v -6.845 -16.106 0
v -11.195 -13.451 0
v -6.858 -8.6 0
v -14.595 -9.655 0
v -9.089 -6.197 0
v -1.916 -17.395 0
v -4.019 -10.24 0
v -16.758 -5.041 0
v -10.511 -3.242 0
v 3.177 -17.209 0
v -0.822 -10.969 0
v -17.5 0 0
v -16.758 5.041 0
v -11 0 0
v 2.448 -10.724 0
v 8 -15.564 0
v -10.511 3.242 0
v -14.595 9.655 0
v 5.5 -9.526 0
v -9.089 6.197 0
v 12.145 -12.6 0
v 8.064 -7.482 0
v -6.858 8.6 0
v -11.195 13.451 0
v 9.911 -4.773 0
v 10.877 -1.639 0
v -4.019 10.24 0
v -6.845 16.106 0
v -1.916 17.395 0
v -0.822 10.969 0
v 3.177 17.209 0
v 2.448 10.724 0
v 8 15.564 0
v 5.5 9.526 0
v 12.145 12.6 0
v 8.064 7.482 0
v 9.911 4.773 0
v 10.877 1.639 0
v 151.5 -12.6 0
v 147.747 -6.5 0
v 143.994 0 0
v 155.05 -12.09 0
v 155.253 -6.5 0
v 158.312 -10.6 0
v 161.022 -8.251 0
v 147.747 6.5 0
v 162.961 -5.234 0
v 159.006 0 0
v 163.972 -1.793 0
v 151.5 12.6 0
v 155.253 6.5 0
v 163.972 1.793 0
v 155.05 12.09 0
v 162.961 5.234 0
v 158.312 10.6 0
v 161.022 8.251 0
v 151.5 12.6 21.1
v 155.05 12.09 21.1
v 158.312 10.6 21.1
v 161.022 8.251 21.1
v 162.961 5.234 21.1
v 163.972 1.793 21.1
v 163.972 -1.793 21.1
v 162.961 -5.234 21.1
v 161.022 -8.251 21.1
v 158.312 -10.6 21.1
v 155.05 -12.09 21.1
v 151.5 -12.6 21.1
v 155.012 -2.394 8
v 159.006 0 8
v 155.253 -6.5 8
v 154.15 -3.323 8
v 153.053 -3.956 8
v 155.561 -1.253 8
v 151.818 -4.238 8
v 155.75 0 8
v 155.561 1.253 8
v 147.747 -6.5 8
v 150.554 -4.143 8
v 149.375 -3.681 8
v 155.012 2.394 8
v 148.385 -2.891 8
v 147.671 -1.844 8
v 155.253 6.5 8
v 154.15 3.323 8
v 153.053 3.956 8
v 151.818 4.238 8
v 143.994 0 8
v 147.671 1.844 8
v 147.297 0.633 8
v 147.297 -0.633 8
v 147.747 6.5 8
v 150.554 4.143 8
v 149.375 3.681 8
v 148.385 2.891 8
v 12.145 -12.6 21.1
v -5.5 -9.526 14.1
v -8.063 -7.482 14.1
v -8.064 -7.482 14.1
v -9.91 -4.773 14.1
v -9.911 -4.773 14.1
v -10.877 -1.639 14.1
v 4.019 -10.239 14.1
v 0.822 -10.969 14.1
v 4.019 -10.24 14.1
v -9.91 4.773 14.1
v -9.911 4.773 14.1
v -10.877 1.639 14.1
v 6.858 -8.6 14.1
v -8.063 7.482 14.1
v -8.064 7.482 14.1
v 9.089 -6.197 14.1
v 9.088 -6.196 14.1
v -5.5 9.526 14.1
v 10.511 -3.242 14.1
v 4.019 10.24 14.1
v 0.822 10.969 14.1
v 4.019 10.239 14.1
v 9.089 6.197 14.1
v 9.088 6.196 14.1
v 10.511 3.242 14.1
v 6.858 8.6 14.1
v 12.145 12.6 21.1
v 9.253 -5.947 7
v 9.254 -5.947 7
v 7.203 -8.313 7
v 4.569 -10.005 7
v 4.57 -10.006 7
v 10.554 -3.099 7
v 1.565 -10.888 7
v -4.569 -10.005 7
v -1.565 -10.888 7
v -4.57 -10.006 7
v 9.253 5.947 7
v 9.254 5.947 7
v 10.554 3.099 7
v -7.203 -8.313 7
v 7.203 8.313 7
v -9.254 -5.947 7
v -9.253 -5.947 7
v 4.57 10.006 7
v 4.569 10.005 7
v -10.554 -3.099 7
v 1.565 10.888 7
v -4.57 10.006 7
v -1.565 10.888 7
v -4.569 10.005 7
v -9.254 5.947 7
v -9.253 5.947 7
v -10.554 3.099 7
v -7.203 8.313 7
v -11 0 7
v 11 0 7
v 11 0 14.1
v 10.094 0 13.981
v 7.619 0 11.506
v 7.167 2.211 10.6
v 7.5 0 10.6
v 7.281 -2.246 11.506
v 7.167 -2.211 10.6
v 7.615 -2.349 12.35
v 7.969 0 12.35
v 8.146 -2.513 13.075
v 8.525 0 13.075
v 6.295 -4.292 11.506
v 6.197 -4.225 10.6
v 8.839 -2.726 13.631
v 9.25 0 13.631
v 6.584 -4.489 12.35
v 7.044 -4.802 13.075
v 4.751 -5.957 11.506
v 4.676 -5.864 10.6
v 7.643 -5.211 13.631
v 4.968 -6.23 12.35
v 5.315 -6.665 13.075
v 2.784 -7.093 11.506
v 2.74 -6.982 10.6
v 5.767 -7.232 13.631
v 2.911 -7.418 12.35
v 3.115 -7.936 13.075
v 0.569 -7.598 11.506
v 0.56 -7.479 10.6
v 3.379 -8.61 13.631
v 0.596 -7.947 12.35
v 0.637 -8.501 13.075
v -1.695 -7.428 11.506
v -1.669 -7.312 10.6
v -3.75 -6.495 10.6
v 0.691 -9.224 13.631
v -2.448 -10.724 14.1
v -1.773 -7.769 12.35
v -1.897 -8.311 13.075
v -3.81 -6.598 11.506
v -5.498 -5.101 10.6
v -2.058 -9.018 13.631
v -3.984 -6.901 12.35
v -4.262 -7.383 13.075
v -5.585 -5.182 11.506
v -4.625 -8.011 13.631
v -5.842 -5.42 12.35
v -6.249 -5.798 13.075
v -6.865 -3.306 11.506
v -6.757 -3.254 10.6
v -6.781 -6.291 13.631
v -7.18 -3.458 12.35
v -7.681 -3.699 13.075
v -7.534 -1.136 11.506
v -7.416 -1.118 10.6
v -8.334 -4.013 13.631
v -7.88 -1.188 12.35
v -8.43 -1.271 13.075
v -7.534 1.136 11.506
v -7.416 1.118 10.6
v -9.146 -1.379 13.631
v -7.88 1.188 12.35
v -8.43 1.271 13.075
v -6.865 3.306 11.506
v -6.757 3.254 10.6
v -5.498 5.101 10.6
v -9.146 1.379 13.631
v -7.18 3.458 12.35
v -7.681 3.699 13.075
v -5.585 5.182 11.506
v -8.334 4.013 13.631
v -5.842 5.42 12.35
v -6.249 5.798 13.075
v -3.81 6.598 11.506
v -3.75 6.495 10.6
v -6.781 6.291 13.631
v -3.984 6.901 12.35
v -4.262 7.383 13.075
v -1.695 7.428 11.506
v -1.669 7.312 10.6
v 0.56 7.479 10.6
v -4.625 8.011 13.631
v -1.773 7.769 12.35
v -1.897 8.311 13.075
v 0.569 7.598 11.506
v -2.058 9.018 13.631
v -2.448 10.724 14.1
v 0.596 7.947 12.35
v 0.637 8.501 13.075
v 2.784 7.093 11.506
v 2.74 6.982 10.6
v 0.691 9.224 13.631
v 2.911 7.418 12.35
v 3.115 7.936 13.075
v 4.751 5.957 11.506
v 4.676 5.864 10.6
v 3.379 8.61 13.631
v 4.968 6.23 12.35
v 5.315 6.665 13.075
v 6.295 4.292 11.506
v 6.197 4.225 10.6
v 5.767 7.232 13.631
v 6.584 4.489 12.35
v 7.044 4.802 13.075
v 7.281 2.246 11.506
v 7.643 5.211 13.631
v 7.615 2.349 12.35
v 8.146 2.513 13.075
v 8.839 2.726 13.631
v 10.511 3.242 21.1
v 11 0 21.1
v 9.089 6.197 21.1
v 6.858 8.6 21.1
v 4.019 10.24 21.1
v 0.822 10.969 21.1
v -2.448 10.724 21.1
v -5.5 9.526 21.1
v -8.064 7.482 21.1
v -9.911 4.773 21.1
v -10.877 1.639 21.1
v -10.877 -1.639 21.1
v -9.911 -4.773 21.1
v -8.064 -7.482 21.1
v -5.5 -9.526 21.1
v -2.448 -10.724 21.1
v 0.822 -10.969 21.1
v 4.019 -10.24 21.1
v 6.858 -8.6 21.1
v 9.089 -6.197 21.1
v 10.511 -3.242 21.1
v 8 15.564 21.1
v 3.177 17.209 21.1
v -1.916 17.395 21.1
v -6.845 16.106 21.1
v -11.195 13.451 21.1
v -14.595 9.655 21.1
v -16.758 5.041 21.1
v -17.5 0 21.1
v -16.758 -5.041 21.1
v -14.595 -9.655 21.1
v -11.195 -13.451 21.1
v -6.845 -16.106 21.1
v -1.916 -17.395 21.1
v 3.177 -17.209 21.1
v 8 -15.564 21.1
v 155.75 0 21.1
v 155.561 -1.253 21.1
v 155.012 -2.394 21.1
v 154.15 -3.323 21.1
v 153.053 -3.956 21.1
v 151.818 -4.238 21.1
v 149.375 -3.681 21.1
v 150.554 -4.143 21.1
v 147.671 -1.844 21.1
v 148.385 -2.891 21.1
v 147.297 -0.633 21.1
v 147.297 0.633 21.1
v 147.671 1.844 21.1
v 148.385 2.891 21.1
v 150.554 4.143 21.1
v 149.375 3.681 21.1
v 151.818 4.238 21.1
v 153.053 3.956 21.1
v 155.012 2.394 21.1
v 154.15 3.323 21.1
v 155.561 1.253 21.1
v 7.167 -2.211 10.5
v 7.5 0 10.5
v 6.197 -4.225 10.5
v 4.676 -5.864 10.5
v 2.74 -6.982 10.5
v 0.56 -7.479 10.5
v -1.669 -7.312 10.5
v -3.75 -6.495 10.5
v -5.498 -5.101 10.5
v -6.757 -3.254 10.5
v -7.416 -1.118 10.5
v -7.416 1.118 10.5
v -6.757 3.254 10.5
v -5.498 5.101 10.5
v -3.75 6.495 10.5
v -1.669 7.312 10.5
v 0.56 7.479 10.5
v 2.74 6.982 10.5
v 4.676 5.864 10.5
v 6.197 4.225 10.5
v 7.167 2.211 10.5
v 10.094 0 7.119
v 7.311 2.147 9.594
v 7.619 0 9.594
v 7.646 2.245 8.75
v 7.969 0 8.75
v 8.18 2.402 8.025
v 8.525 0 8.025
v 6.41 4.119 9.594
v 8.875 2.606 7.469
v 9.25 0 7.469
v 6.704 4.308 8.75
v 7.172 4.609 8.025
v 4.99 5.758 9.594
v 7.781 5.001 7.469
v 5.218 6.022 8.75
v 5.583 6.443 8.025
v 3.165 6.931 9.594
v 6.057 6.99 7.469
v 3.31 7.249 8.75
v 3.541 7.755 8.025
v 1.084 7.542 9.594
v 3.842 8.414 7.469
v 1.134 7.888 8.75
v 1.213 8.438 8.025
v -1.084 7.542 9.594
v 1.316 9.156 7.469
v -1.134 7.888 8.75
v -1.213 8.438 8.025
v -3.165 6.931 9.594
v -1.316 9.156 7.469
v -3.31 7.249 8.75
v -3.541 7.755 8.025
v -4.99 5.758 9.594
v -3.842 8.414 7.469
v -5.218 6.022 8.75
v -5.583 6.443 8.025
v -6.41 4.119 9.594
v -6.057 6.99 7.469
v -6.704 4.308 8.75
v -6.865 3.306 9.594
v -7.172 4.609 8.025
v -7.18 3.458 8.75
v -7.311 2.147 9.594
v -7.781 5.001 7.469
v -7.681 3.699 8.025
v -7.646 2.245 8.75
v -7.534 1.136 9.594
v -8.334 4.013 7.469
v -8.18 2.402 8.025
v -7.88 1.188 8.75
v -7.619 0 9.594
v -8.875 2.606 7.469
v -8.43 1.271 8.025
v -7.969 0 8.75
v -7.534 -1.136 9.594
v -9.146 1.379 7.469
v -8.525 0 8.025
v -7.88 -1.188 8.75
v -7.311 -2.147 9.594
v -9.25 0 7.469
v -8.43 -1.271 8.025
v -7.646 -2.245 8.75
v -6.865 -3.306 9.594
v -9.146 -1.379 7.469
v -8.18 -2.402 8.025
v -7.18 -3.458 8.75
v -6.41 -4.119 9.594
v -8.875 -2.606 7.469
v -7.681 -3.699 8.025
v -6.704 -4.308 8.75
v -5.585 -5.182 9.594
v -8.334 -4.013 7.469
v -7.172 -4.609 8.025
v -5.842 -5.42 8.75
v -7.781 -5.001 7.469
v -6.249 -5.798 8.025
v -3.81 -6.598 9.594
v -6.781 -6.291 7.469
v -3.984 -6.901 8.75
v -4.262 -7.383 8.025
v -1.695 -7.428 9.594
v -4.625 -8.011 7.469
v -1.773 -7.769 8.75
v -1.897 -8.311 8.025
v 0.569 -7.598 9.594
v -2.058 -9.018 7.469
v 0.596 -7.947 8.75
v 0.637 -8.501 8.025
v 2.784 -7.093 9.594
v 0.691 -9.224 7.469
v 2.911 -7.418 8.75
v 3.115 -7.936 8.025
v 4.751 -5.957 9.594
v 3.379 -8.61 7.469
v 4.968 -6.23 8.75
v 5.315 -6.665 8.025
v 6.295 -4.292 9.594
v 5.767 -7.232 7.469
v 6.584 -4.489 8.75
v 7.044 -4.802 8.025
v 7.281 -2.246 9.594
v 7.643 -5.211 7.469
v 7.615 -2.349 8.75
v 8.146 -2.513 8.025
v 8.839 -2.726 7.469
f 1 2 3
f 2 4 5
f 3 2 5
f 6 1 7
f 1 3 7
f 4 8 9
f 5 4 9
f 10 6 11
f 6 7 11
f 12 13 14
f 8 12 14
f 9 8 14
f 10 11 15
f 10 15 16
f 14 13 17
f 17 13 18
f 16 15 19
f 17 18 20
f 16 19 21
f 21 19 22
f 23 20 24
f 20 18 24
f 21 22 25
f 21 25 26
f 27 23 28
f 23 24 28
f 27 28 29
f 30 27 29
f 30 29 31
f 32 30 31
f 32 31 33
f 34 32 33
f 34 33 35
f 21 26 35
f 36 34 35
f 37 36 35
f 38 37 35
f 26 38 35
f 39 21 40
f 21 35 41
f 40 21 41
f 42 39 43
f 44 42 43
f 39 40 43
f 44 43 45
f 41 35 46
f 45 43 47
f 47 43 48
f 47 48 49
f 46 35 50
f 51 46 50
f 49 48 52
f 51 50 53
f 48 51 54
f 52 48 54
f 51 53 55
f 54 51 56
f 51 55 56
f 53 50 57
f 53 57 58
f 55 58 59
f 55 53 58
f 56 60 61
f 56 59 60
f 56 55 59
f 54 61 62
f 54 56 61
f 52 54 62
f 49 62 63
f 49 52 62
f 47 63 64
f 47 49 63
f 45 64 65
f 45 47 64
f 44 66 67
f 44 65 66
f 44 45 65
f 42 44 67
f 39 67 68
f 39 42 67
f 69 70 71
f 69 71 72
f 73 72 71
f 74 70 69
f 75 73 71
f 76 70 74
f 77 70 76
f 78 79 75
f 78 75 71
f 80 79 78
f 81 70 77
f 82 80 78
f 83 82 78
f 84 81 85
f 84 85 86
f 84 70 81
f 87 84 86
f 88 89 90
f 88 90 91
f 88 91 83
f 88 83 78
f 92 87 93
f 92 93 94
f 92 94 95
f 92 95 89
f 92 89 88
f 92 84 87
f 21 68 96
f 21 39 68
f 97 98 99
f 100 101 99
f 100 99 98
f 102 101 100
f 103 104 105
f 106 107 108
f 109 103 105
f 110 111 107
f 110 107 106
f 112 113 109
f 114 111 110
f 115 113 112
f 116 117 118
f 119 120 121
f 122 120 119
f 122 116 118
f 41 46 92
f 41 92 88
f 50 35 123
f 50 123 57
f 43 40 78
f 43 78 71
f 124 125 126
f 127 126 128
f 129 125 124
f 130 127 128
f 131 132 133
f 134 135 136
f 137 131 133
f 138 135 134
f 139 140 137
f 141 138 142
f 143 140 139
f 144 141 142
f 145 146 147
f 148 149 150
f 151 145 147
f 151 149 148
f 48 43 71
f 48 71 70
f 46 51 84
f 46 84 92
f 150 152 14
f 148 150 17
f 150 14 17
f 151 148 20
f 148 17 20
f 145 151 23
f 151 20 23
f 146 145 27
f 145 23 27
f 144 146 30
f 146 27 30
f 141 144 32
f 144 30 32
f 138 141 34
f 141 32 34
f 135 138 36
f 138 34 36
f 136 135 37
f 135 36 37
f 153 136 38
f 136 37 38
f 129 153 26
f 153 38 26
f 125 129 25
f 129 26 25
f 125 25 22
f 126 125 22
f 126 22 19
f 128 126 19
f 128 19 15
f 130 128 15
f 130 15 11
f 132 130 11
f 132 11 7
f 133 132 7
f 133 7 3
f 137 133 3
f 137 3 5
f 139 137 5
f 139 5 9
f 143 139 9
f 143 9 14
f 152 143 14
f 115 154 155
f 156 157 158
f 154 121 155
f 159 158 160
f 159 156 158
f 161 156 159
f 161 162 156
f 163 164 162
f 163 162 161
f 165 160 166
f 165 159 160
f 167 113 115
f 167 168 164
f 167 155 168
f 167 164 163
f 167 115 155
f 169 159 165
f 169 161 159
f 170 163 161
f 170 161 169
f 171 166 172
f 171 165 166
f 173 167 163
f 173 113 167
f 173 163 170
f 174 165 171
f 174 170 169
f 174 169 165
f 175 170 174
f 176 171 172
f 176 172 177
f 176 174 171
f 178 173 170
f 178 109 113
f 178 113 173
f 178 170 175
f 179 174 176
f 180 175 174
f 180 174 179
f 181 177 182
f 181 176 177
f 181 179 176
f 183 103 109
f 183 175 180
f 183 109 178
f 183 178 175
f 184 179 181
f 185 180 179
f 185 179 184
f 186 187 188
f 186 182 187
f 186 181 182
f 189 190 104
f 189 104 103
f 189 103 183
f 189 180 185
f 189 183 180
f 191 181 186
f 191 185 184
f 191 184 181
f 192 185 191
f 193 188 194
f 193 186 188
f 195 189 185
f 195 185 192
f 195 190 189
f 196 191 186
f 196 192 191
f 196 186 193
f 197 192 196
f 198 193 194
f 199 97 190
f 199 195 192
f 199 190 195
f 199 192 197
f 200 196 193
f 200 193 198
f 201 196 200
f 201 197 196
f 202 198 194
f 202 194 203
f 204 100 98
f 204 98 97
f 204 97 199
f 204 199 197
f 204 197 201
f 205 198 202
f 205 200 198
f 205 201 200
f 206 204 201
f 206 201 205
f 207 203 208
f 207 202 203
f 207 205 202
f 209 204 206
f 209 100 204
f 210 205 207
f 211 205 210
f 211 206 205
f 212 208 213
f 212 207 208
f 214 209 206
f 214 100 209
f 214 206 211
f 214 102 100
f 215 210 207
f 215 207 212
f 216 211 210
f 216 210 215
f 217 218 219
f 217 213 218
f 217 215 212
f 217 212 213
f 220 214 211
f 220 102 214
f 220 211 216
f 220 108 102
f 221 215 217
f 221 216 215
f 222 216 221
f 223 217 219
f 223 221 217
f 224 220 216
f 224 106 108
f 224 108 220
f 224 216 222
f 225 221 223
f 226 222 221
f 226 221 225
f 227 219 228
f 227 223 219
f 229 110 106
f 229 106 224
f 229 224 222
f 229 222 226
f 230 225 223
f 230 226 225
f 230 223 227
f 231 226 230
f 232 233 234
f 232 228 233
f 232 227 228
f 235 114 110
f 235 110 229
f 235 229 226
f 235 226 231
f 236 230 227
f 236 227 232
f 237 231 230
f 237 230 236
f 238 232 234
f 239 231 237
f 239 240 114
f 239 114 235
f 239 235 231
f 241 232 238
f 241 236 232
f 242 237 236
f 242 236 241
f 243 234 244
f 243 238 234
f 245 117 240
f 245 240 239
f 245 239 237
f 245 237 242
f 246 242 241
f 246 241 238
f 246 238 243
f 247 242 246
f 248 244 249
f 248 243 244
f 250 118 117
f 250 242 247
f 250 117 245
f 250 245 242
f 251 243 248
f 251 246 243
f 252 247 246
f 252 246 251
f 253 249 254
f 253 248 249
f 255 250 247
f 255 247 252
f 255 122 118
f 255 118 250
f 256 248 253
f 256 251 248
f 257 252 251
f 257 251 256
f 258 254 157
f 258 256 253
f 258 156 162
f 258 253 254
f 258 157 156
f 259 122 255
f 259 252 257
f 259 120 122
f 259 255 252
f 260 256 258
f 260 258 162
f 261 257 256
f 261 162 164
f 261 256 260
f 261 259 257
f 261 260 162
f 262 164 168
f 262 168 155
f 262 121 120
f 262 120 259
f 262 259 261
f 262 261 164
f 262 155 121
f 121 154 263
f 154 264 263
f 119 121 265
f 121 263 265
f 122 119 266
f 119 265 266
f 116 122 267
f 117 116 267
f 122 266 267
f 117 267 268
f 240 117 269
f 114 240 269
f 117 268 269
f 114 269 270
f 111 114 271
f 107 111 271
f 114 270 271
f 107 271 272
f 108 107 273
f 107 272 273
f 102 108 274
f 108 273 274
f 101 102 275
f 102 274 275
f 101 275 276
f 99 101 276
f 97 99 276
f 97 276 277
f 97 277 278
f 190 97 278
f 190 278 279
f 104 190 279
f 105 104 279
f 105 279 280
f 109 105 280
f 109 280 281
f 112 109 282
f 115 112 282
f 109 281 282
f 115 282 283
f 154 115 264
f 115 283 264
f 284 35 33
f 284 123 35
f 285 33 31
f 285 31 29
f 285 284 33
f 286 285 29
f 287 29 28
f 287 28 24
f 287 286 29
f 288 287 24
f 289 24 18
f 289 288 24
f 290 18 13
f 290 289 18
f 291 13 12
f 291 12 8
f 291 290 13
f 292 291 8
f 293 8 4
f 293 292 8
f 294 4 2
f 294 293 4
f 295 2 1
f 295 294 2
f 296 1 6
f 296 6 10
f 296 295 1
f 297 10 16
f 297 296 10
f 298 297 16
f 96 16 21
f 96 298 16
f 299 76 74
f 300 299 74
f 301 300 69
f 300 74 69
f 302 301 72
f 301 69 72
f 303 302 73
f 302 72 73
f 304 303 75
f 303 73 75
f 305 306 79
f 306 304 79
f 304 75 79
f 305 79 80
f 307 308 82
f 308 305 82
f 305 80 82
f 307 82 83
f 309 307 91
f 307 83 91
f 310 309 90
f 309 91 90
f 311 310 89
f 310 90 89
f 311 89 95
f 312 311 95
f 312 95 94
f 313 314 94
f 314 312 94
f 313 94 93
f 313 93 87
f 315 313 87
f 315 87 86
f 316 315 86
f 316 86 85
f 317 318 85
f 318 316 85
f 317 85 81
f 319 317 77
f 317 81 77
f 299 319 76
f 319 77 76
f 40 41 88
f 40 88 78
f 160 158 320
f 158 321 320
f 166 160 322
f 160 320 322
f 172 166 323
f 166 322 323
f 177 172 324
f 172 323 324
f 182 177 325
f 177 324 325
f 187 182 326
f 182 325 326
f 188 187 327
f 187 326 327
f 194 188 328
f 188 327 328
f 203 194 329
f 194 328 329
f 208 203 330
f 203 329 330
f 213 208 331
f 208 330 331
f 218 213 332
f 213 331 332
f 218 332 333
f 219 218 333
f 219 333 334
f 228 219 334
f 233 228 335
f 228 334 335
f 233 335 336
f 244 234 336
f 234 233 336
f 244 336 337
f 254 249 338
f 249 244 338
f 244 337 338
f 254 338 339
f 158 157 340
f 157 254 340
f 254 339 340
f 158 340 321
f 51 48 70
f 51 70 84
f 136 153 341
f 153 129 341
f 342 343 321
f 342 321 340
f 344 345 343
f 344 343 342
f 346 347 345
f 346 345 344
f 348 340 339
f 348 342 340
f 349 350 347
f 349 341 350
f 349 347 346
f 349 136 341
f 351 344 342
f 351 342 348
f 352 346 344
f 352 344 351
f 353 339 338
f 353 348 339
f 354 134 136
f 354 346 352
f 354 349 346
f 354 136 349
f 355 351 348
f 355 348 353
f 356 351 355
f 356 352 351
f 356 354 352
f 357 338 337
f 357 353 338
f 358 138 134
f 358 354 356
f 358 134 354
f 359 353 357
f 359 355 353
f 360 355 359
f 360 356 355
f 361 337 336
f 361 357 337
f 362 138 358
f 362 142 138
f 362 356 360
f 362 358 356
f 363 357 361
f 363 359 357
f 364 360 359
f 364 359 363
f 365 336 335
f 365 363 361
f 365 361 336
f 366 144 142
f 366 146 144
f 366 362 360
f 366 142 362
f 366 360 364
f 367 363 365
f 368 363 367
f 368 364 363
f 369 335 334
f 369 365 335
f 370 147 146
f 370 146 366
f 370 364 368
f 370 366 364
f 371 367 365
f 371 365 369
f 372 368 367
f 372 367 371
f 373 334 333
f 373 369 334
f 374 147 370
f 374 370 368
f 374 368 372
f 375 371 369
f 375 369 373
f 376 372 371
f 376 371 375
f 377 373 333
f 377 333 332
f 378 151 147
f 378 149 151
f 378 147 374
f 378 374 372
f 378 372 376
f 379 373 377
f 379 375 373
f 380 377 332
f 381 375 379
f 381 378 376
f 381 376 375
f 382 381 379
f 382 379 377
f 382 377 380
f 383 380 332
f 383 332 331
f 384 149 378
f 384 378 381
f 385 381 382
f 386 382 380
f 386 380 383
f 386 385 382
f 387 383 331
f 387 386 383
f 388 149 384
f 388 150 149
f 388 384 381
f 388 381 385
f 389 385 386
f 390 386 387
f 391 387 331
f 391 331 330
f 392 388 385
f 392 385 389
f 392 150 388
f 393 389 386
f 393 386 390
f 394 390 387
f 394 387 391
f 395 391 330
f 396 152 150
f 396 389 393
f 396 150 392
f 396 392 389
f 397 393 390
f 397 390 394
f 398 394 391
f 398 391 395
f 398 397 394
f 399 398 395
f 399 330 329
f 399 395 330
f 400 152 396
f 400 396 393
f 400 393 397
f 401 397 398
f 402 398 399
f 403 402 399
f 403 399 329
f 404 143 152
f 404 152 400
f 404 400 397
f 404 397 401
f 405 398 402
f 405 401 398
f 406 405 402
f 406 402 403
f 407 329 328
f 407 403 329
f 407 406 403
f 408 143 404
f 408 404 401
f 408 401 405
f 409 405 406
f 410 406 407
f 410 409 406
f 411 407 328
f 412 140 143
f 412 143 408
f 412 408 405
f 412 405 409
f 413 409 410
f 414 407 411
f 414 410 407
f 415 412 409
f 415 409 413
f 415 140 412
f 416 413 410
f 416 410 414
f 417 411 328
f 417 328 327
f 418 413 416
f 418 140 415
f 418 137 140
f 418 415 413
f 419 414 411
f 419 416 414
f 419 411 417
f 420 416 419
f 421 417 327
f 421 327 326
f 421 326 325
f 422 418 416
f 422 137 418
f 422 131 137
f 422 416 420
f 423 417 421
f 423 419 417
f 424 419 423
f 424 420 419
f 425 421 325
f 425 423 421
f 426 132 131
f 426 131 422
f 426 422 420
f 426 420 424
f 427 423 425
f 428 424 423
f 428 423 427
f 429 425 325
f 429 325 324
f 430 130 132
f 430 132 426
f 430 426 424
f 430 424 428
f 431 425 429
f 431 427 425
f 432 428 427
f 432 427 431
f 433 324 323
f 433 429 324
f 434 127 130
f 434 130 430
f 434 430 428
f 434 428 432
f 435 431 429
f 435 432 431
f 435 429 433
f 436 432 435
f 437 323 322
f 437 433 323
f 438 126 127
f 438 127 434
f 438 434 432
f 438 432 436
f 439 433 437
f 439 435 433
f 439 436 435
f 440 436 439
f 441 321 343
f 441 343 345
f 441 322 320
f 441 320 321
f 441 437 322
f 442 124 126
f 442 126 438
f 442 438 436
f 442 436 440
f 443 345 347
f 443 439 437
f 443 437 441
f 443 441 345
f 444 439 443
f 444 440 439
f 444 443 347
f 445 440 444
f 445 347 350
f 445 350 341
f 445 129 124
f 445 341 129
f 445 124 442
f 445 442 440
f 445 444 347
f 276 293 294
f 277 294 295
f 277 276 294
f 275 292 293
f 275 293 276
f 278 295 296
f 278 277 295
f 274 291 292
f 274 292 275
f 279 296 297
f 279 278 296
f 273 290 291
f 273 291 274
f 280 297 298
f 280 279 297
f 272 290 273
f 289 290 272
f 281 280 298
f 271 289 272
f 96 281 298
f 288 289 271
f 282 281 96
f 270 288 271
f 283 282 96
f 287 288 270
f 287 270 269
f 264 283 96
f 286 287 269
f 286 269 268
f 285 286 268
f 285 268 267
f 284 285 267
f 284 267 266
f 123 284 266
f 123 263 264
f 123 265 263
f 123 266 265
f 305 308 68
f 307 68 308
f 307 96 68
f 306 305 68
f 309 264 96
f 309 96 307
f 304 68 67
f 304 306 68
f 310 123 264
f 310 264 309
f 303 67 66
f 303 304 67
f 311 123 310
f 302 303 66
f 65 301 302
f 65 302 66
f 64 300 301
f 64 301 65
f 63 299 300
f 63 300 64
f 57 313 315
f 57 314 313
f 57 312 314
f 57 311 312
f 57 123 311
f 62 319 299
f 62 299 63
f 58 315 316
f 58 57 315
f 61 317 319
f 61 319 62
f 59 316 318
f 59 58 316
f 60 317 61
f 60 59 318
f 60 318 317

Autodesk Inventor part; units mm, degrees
ref_plane "YZ Plane" through (0, 0, 0) normal (1, 0, 0) x (0, 1, 0)
ref_plane "XZ Plane" through (0, 0, 0) normal (0, 1, 0) x (-1, 0, 0)
ref_plane "XY Plane" through (0, 0, 0) normal (0, 0, 1) x (1, 0, 0)
sketch "Sketch1" plane through (0, 0, 0) normal (0, 0, 1) x (1, 0, 0)
  line L0 (0, 12.6) -> (151.5, 12.6)
  arc A0 (151.5, -12.6) -> (151.5, 12.6) centre (151.5, 0) ccw
  line L1 (151.5, -12.6) -> (0, -12.6)
  arc A1 (0, 12.6) -> (0, -12.6) centre (0, 0) ccw
  circle A2 centre (0, 0) radius 7.5
  circle A3 centre (151.5, 0) radius 4.25
  dimension "d0" = 151.5
  dimension "d2" = 12.6
  dimension "d3" = 15
  dimension "d4" = 8.5
extrude "Extrusion1" add sketch "Sketch1" along normal blind 21.1
sketch "Sketch2" plane through (0, 0, 21.1) normal (0, 0, 1) x (1, 0, 0)
  circle A0 centre (0, 0) radius 7.5 projected
  arc A1 (0, 12.6) -> (0, -12.6) centre (0, 0) ccw projected
  circle A2 centre (0, 0) radius 11
  dimension "d7" = 22
extrude "Extrusion2" cut sketch "Sketch2" against normal blind 7
sketch "Sketch6" plane through (0, 0, 21.1) normal (0, 0, 1) x (1, 0, 0)
  circle A0 centre (0, 0) radius 11 projected
  arc A1 (0, 12.6) -> (0, -12.6) centre (0, 0) ccw projected
  circle A2 centre (0, 0) radius 17.5
  dimension "d25" = 35
extrude "Extrusion5" add sketch "Sketch6" against normal up to surface (21.1 mm away)
sketch "Sketch7" plane through (0, 0, 0) normal (0, 0, -1) x (-1, 0, 0)
  circle A0 centre (0, 0) radius 7.5 projected
  circle A1 centre (0, 0) radius 11 projected
extrude "Extrusion6" cut sketch "Sketch7" against normal blind 7
sketch "Sketch8" plane through (0, 0, 0) normal (0, 0, -1) x (-1, 0, 0)
  circle A0 centre (-151.5, 0) radius 4.25 projected
  arc A1 (-151.5, 12.6) -> (-151.5, -12.6) centre (-151.5, 0) ccw projected
  line L0 (-143.9944, 0) -> (-147.7472, -6.5)
  line L1 (-147.7472, -6.5) -> (-155.2528, -6.5)
  line L2 (-155.2528, -6.5) -> (-159.0056, 0)
  line L3 (-159.0056, 0) -> (-155.2528, 6.5)
  line L4 (-155.2528, 6.5) -> (-147.7472, 6.5)
  line L5 (-147.7472, 6.5) -> (-143.9944, 0)
  dimension "d31" = 13
extrude "Extrusion7" cut sketch "Sketch8" against normal blind 8
fillet "Fillet1" radius 3.5 1 edges at (-7.5, 0, 14.1)
fillet "Fillet2" radius 3.5 1 edges at (-7.5, 0, 7)
properties part number "proximal thin arm"
